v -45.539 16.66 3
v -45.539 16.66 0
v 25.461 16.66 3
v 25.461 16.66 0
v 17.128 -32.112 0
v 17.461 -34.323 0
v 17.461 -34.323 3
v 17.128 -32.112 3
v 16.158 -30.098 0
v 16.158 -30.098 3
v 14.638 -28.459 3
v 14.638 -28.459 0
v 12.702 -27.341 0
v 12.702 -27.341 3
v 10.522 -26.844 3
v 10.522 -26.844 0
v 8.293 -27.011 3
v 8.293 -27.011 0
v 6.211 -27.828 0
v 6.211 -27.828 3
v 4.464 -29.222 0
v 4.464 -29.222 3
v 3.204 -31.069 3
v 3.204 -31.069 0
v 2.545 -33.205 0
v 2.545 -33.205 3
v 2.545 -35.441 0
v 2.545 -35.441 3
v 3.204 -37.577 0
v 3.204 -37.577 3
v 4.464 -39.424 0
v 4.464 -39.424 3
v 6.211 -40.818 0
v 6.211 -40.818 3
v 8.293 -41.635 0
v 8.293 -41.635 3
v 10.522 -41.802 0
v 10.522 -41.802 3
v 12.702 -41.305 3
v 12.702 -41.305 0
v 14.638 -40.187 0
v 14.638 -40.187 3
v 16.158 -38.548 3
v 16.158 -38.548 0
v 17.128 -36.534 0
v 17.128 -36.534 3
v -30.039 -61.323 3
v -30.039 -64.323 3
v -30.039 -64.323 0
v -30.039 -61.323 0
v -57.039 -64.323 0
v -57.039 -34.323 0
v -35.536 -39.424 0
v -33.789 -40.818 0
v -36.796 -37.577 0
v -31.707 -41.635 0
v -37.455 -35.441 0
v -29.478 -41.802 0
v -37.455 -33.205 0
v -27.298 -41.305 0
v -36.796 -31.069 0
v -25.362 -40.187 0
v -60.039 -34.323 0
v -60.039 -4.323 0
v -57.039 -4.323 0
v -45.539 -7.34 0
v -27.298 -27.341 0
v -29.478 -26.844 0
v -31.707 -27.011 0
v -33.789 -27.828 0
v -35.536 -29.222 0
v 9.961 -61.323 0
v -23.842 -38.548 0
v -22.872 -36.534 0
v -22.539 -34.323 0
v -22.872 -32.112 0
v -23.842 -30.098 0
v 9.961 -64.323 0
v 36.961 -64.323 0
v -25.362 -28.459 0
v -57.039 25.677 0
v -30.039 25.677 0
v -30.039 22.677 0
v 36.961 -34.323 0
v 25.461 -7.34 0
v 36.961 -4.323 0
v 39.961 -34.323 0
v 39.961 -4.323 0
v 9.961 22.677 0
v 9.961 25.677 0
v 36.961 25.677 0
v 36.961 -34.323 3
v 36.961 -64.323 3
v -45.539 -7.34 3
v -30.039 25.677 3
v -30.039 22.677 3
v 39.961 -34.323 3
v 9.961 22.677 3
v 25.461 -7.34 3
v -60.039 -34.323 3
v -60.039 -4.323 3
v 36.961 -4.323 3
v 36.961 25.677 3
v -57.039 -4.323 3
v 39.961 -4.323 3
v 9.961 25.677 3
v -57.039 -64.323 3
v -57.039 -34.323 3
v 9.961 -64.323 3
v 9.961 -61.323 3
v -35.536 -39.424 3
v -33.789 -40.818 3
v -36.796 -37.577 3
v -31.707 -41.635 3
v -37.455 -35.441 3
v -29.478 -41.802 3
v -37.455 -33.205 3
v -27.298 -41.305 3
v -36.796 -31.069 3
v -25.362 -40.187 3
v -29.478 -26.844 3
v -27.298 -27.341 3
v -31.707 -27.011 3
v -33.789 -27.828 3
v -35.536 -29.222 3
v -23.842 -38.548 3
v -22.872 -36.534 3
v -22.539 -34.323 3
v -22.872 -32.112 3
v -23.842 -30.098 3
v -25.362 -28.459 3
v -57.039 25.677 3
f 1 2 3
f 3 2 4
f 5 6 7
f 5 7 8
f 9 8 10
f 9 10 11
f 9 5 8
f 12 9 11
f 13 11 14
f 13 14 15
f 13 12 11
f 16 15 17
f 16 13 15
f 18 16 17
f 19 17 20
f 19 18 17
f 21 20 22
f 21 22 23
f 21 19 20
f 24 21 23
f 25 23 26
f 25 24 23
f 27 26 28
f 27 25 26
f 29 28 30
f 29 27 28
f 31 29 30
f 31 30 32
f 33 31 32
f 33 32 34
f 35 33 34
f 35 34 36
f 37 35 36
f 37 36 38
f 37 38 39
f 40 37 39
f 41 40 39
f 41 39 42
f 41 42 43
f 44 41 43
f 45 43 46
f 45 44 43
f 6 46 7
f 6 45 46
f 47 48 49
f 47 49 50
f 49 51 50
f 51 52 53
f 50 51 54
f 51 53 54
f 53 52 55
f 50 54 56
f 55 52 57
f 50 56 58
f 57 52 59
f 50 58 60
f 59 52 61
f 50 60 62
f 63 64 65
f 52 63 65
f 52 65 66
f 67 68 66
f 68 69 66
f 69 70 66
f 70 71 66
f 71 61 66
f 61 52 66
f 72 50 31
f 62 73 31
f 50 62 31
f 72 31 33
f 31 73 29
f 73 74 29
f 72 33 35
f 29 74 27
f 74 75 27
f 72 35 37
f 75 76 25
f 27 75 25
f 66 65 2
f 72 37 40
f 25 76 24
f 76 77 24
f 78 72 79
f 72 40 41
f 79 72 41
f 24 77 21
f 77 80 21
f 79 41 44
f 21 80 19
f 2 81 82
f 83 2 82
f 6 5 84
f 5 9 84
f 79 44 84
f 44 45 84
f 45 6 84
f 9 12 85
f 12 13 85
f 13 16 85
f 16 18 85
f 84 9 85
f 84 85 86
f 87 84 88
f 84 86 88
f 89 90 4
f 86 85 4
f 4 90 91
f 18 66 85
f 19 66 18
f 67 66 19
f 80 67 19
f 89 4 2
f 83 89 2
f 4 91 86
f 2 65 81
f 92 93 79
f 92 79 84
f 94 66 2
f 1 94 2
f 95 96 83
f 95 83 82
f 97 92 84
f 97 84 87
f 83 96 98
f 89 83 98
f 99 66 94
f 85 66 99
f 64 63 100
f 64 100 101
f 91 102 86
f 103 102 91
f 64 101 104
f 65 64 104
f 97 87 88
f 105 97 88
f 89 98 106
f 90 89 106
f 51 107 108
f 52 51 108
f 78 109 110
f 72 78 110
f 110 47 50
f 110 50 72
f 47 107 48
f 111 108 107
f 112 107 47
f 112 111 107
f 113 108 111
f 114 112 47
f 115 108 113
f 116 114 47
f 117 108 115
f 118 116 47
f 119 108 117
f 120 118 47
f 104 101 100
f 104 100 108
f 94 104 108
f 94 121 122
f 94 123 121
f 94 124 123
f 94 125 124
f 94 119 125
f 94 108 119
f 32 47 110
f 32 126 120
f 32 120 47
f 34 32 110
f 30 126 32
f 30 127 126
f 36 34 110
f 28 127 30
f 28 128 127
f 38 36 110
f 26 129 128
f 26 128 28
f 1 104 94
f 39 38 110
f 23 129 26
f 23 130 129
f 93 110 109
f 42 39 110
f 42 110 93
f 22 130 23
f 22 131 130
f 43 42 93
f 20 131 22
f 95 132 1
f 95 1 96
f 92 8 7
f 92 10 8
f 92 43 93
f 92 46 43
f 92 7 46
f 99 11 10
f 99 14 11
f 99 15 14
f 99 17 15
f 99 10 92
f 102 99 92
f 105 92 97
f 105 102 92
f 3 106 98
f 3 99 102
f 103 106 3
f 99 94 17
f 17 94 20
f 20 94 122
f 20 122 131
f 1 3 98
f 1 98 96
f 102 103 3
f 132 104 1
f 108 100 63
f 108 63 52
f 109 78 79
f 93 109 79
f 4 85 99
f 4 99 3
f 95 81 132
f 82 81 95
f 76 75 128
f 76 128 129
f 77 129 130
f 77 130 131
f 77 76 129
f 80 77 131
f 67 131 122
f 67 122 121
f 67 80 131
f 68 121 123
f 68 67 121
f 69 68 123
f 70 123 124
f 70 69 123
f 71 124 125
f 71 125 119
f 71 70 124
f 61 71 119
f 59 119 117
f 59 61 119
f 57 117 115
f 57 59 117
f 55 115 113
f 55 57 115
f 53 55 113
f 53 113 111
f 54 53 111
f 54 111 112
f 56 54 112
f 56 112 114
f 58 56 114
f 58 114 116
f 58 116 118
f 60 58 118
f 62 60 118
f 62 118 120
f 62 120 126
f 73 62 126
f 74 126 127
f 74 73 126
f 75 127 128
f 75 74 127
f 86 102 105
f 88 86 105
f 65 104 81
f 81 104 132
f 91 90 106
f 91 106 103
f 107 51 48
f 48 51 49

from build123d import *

# Parameters (mm, degrees)
ESQUISSE1_W             = 100
ESQUISSE1_H             = 90
ESQUISSE1_R             = 7.5
ESQUISSE1_W_2           = 71
ESQUISSE1_H_2           = 24
BOSS_EXTRU_1_DEPTH      = 3
ENL_V_MAT_EXTRU_1_REACH = 90.04
ESQUISSE2_W             = 40
ESQUISSE2_H             = 3
ESQUISSE2_W_2           = 3
ESQUISSE2_H_2           = 30


with BuildPart() as part:
    # Esquisse1 → Boss.-Extru.1 (new body)
    with BuildSketch(Plane.XY):
        with Locations((-10.038524431, -19.32304038)):
            Rectangle(ESQUISSE1_W, ESQUISSE1_H)
        with Locations((-30.038524431, -34.32304038)):
            Circle(ESQUISSE1_R, mode=Mode.SUBTRACT)
        with Locations((9.961475569, -34.32304038)):
            Circle(ESQUISSE1_R, mode=Mode.SUBTRACT)
        with Locations((-10.038524431, 4.660332542)):
            Rectangle(ESQUISSE1_W_2, ESQUISSE1_H_2, mode=Mode.SUBTRACT)
    extrude(amount=BOSS_EXTRU_1_DEPTH)

    # Esquisse2 → Enlèv. mat.-Extru.1 (cut, up to next)
    with BuildSketch(Plane.XY.offset(3), mode=Mode.PRIVATE) as enl_v_mat_extru_1_sk1:
        with Locations((-10.038524431, 24.17695962)):
            Rectangle(ESQUISSE2_W, ESQUISSE2_H)
    enl_v_mat_extru_1_tool1 = extrude(enl_v_mat_extru_1_sk1.sketch, amount=-ENL_V_MAT_EXTRU_1_REACH, mode=Mode.PRIVATE) & part.part
    # Esquisse2 → Enlèv. mat.-Extru.1 (cut, up to next)
    with BuildSketch(Plane.XY.offset(3), mode=Mode.PRIVATE) as enl_v_mat_extru_1_sk2:
        with Locations((-58.538524431, 10.67695962)):
            Rectangle(ESQUISSE2_W_2, ESQUISSE2_H_2)
    enl_v_mat_extru_1_tool2 = extrude(enl_v_mat_extru_1_sk2.sketch, amount=-ENL_V_MAT_EXTRU_1_REACH, mode=Mode.PRIVATE) & part.part
    # Esquisse2 → Enlèv. mat.-Extru.1 (cut, up to next)
    with BuildSketch(Plane.XY.offset(3), mode=Mode.PRIVATE) as enl_v_mat_extru_1_sk3:
        with Locations((-58.538524431, -49.32304038)):
            Rectangle(ESQUISSE2_W_2, ESQUISSE2_H_2)
    enl_v_mat_extru_1_tool3 = extrude(enl_v_mat_extru_1_sk3.sketch, amount=-ENL_V_MAT_EXTRU_1_REACH, mode=Mode.PRIVATE) & part.part
    # Esquisse2 → Enlèv. mat.-Extru.1 (cut, up to next)
    with BuildSketch(Plane.XY.offset(3), mode=Mode.PRIVATE) as enl_v_mat_extru_1_sk4:
        with Locations((-10.038524431, -62.82304038)):
            Rectangle(ESQUISSE2_W, ESQUISSE2_H)
    enl_v_mat_extru_1_tool4 = extrude(enl_v_mat_extru_1_sk4.sketch, amount=-ENL_V_MAT_EXTRU_1_REACH, mode=Mode.PRIVATE) & part.part
    # Esquisse2 → Enlèv. mat.-Extru.1 (cut, up to next)
    with BuildSketch(Plane.XY.offset(3), mode=Mode.PRIVATE) as enl_v_mat_extru_1_sk5:
        with Locations((38.461475569, -49.32304038)):
            Rectangle(ESQUISSE2_W_2, ESQUISSE2_H_2)
    enl_v_mat_extru_1_tool5 = extrude(enl_v_mat_extru_1_sk5.sketch, amount=-ENL_V_MAT_EXTRU_1_REACH, mode=Mode.PRIVATE) & part.part
    # Esquisse2 → Enlèv. mat.-Extru.1 (cut, up to next)
    with BuildSketch(Plane.XY.offset(3), mode=Mode.PRIVATE) as enl_v_mat_extru_1_sk6:
        with Locations((38.461475569, 10.67695962)):
            Rectangle(ESQUISSE2_W_2, ESQUISSE2_H_2)
    enl_v_mat_extru_1_tool6 = extrude(enl_v_mat_extru_1_sk6.sketch, amount=-ENL_V_MAT_EXTRU_1_REACH, mode=Mode.PRIVATE) & part.part
    add(enl_v_mat_extru_1_tool1.solids().sort_by_distance((-10.038524, 24.17696, 3))[0], mode=Mode.SUBTRACT)
    add(enl_v_mat_extru_1_tool2.solids().sort_by_distance((-58.538524, 10.67696, 3))[0], mode=Mode.SUBTRACT)
    add(enl_v_mat_extru_1_tool3.solids().sort_by_distance((-58.538524, -49.32304, 3))[0], mode=Mode.SUBTRACT)
    add(enl_v_mat_extru_1_tool4.solids().sort_by_distance((-10.038524, -62.82304, 3))[0], mode=Mode.SUBTRACT)
    add(enl_v_mat_extru_1_tool5.solids().sort_by_distance((38.461476, -49.32304, 3))[0], mode=Mode.SUBTRACT)
    add(enl_v_mat_extru_1_tool6.solids().sort_by_distance((38.461476, 10.67696, 3))[0], mode=Mode.SUBTRACT)


solid = part.part
